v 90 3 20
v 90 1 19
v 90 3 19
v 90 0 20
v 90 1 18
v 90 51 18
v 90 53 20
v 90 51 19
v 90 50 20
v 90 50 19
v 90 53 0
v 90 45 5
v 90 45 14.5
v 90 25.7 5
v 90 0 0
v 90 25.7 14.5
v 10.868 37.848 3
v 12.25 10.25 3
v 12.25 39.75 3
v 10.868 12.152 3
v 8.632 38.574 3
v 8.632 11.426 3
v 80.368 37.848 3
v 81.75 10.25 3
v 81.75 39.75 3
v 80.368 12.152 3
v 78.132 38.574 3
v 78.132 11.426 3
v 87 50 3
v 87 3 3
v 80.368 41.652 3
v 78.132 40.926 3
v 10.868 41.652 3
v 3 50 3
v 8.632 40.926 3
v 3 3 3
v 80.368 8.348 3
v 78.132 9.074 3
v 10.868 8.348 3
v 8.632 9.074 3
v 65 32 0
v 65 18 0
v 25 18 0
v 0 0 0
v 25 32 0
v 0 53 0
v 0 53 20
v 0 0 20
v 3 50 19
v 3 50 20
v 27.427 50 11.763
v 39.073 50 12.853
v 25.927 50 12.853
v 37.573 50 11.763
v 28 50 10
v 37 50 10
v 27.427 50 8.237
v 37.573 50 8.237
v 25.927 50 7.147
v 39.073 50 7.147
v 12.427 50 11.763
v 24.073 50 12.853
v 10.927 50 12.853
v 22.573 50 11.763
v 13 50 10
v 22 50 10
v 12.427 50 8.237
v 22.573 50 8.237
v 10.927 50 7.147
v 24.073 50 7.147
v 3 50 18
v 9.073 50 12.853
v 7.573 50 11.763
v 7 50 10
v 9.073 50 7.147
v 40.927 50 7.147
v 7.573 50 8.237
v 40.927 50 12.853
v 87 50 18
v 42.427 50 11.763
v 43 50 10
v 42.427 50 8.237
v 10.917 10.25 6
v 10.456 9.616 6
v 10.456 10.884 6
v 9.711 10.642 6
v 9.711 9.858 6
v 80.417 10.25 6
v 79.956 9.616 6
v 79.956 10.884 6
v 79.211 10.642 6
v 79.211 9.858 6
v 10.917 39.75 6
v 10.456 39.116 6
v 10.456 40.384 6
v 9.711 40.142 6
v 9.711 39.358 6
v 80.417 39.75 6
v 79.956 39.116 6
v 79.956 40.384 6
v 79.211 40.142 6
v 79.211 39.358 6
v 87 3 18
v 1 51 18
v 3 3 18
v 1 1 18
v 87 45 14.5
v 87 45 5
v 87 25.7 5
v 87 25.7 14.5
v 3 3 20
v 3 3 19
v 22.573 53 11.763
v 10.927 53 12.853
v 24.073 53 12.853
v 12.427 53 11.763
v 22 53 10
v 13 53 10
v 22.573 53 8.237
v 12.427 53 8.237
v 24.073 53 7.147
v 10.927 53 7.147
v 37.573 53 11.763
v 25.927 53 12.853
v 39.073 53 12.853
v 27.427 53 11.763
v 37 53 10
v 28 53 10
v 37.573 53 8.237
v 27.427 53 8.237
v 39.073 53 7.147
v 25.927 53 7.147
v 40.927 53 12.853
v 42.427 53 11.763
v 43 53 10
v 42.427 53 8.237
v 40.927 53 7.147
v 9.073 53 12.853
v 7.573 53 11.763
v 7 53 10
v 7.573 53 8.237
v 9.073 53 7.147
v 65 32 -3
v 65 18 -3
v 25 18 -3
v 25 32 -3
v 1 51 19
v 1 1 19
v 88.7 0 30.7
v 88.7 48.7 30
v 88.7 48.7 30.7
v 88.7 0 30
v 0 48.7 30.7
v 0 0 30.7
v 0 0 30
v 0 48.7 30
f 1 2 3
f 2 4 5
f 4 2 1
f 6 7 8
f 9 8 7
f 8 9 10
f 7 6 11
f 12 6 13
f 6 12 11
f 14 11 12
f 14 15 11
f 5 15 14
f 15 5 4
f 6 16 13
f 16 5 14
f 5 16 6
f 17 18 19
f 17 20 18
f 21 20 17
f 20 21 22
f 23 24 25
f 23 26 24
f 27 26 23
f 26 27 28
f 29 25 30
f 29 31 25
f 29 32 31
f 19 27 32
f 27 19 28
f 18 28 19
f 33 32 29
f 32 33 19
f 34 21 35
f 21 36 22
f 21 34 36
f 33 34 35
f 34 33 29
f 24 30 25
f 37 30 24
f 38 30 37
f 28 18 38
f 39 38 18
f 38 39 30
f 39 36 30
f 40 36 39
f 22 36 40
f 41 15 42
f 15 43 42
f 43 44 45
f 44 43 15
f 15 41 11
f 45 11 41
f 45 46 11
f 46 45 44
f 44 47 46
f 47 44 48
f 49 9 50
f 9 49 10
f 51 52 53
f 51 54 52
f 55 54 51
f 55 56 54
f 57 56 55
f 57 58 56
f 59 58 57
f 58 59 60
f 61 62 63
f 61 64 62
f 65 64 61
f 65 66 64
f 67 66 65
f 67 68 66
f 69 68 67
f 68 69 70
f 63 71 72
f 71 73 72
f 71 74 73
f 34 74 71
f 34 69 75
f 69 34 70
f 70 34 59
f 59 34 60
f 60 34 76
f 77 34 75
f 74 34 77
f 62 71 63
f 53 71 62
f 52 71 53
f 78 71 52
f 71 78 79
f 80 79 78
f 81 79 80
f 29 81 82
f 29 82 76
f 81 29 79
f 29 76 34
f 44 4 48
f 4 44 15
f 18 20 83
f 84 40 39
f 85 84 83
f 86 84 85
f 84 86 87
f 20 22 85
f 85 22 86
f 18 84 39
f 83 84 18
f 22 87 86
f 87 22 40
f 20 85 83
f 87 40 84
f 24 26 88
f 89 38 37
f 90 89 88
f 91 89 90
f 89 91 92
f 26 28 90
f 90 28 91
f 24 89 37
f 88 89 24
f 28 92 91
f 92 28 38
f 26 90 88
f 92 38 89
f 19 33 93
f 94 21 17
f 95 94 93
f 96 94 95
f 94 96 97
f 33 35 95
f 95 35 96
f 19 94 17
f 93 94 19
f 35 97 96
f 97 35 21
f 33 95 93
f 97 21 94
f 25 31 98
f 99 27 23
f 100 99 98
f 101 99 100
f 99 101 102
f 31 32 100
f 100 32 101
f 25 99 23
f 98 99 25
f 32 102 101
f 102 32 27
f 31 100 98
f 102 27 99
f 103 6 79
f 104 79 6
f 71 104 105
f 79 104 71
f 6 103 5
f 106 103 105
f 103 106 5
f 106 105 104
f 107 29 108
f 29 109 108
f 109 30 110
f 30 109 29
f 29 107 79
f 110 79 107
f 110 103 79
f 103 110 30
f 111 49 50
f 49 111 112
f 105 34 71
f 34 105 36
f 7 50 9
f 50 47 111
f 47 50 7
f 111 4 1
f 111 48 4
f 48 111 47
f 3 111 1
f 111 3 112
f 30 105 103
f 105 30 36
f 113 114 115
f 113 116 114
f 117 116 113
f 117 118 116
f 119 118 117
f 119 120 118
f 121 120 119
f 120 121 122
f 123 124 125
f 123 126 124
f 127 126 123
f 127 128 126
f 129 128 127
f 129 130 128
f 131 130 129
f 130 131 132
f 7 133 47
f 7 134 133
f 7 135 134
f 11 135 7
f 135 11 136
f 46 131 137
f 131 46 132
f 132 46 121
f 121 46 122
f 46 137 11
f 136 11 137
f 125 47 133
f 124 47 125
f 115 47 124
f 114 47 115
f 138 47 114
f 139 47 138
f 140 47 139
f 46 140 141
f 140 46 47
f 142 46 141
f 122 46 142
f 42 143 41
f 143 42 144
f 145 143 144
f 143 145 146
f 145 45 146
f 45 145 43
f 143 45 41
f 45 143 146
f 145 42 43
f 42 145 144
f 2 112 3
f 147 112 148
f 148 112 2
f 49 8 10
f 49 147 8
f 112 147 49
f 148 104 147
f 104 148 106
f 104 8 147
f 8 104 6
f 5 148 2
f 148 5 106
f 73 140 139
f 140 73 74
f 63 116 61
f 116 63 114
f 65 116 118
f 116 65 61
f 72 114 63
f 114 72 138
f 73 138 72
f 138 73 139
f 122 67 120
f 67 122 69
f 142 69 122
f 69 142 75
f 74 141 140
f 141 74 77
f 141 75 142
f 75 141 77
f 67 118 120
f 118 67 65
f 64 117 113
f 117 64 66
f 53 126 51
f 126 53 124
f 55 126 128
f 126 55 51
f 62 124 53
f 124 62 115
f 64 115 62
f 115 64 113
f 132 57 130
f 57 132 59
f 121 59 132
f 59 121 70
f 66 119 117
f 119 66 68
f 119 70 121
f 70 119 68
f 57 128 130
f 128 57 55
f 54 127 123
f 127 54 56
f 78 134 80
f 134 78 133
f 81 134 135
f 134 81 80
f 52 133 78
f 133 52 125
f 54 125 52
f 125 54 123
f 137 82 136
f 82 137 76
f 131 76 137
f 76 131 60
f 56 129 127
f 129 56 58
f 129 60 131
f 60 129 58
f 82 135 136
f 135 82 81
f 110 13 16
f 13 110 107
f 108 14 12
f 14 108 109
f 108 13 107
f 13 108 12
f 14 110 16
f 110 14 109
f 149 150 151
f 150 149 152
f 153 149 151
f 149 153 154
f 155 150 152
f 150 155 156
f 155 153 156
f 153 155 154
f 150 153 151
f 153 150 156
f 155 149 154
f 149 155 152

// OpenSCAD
// Designed by Misfit beam project
// Ref to Arduino nano size, 0.73" x 1.70" 
// https://www.arduino.cc/en/Main/arduinoBoardNano
// Length	45 mm
// Width	18 mm
length = 90;
width = 50;
height = 20;
thick = 3;
neck = 1;

// docker
// real size 27.5 mm * 67.5 mm
// hole r 1 mm
// hole_offset_x = 1 mm
docker_hole_size = 2;
docker_hole_height = 3;
docker_offset_x = 1;
docker_offset_y = 1;
docker_x = 67.5;
docker_y = 27.5; 

// IR LED
led_r = 3;

// switch size
switch_length = 19.3;
switch_width = 9.5;

module cover(length, width, thick){
    cube(size = [length, width, thick]);
}

module coverWithLogo(length, width, thick){
    cube(size = [length, width, thick]);
    
    translate([length / 2 - 9, width / 2 - 7 ,thick])
    resize([20,0,0.1], auto=true)
    surface(file = "misfit.png", invert = false);
}

module box(){    
    cube(size = [length,width, thick]);
    
    x_offset = (length - docker_x) / 2 - docker_hole_size / 2;
    y_offset = (width - docker_y) / 2 - docker_hole_size / 2;
    
    z_offset = thick;
    
    translate([x_offset, y_offset, z_offset])
    cylinder(h = docker_hole_height, r1=docker_hole_size, r2=docker_hole_size/3,$fs=6);

    translate([length - x_offset, y_offset, z_offset])
    cylinder(h = docker_hole_height, r1=docker_hole_size, r2=docker_hole_size/3,$fs=6);
  
    translate([x_offset, width - y_offset, z_offset])
    cylinder(h = docker_hole_height, r1=docker_hole_size, r2=docker_hole_size/3,$fs=6);
  
    translate([length - x_offset, width - y_offset, z_offset])
    cylinder(h = docker_hole_height, r1=docker_hole_size, r2=docker_hole_size/3,$fs=6);

    translate([length - thick,0,0])
    cube(size = [thick, width, height - neck * 2]);
    
    translate([0,0,0])
    cube(size = [thick, width, height]);

    translate([0,0,0])
    cube(size = [length, thick, height]);

    translate([0,width,0])
    cube(size = [length, thick, height]);
    
    translate([length / 2 - 20, width / 2 - 7, -3])
    cube(size = [40, 14, thick]);
}

module hole(pos){
    translate([pos, width - thick, height / 2])
    rotate([90,0,0])
    cylinder(h = 20, r = led_r, center = true);
}

module switch(x){
    translate([length - thick, x, 5])
    cube(size = [5, switch_length, switch_width]);
} 

// Main box
module mainbox() {
    // Main box
    difference() {
        difference() {
            box();
            
            translate([neck, neck, height - neck * 2])
            cover(length, width, neck);       
        }
        hole(10);
        hole(25);
        hole(40);
        switch(width - switch_length - 5);
    }
}


// Main box...
mainbox();

// Cover
neck_detla = 0.3;
translate([0, 0, 30])
coverWithLogo(length - neck - neck_detla, width - neck - neck_detla, neck - neck_detla);
